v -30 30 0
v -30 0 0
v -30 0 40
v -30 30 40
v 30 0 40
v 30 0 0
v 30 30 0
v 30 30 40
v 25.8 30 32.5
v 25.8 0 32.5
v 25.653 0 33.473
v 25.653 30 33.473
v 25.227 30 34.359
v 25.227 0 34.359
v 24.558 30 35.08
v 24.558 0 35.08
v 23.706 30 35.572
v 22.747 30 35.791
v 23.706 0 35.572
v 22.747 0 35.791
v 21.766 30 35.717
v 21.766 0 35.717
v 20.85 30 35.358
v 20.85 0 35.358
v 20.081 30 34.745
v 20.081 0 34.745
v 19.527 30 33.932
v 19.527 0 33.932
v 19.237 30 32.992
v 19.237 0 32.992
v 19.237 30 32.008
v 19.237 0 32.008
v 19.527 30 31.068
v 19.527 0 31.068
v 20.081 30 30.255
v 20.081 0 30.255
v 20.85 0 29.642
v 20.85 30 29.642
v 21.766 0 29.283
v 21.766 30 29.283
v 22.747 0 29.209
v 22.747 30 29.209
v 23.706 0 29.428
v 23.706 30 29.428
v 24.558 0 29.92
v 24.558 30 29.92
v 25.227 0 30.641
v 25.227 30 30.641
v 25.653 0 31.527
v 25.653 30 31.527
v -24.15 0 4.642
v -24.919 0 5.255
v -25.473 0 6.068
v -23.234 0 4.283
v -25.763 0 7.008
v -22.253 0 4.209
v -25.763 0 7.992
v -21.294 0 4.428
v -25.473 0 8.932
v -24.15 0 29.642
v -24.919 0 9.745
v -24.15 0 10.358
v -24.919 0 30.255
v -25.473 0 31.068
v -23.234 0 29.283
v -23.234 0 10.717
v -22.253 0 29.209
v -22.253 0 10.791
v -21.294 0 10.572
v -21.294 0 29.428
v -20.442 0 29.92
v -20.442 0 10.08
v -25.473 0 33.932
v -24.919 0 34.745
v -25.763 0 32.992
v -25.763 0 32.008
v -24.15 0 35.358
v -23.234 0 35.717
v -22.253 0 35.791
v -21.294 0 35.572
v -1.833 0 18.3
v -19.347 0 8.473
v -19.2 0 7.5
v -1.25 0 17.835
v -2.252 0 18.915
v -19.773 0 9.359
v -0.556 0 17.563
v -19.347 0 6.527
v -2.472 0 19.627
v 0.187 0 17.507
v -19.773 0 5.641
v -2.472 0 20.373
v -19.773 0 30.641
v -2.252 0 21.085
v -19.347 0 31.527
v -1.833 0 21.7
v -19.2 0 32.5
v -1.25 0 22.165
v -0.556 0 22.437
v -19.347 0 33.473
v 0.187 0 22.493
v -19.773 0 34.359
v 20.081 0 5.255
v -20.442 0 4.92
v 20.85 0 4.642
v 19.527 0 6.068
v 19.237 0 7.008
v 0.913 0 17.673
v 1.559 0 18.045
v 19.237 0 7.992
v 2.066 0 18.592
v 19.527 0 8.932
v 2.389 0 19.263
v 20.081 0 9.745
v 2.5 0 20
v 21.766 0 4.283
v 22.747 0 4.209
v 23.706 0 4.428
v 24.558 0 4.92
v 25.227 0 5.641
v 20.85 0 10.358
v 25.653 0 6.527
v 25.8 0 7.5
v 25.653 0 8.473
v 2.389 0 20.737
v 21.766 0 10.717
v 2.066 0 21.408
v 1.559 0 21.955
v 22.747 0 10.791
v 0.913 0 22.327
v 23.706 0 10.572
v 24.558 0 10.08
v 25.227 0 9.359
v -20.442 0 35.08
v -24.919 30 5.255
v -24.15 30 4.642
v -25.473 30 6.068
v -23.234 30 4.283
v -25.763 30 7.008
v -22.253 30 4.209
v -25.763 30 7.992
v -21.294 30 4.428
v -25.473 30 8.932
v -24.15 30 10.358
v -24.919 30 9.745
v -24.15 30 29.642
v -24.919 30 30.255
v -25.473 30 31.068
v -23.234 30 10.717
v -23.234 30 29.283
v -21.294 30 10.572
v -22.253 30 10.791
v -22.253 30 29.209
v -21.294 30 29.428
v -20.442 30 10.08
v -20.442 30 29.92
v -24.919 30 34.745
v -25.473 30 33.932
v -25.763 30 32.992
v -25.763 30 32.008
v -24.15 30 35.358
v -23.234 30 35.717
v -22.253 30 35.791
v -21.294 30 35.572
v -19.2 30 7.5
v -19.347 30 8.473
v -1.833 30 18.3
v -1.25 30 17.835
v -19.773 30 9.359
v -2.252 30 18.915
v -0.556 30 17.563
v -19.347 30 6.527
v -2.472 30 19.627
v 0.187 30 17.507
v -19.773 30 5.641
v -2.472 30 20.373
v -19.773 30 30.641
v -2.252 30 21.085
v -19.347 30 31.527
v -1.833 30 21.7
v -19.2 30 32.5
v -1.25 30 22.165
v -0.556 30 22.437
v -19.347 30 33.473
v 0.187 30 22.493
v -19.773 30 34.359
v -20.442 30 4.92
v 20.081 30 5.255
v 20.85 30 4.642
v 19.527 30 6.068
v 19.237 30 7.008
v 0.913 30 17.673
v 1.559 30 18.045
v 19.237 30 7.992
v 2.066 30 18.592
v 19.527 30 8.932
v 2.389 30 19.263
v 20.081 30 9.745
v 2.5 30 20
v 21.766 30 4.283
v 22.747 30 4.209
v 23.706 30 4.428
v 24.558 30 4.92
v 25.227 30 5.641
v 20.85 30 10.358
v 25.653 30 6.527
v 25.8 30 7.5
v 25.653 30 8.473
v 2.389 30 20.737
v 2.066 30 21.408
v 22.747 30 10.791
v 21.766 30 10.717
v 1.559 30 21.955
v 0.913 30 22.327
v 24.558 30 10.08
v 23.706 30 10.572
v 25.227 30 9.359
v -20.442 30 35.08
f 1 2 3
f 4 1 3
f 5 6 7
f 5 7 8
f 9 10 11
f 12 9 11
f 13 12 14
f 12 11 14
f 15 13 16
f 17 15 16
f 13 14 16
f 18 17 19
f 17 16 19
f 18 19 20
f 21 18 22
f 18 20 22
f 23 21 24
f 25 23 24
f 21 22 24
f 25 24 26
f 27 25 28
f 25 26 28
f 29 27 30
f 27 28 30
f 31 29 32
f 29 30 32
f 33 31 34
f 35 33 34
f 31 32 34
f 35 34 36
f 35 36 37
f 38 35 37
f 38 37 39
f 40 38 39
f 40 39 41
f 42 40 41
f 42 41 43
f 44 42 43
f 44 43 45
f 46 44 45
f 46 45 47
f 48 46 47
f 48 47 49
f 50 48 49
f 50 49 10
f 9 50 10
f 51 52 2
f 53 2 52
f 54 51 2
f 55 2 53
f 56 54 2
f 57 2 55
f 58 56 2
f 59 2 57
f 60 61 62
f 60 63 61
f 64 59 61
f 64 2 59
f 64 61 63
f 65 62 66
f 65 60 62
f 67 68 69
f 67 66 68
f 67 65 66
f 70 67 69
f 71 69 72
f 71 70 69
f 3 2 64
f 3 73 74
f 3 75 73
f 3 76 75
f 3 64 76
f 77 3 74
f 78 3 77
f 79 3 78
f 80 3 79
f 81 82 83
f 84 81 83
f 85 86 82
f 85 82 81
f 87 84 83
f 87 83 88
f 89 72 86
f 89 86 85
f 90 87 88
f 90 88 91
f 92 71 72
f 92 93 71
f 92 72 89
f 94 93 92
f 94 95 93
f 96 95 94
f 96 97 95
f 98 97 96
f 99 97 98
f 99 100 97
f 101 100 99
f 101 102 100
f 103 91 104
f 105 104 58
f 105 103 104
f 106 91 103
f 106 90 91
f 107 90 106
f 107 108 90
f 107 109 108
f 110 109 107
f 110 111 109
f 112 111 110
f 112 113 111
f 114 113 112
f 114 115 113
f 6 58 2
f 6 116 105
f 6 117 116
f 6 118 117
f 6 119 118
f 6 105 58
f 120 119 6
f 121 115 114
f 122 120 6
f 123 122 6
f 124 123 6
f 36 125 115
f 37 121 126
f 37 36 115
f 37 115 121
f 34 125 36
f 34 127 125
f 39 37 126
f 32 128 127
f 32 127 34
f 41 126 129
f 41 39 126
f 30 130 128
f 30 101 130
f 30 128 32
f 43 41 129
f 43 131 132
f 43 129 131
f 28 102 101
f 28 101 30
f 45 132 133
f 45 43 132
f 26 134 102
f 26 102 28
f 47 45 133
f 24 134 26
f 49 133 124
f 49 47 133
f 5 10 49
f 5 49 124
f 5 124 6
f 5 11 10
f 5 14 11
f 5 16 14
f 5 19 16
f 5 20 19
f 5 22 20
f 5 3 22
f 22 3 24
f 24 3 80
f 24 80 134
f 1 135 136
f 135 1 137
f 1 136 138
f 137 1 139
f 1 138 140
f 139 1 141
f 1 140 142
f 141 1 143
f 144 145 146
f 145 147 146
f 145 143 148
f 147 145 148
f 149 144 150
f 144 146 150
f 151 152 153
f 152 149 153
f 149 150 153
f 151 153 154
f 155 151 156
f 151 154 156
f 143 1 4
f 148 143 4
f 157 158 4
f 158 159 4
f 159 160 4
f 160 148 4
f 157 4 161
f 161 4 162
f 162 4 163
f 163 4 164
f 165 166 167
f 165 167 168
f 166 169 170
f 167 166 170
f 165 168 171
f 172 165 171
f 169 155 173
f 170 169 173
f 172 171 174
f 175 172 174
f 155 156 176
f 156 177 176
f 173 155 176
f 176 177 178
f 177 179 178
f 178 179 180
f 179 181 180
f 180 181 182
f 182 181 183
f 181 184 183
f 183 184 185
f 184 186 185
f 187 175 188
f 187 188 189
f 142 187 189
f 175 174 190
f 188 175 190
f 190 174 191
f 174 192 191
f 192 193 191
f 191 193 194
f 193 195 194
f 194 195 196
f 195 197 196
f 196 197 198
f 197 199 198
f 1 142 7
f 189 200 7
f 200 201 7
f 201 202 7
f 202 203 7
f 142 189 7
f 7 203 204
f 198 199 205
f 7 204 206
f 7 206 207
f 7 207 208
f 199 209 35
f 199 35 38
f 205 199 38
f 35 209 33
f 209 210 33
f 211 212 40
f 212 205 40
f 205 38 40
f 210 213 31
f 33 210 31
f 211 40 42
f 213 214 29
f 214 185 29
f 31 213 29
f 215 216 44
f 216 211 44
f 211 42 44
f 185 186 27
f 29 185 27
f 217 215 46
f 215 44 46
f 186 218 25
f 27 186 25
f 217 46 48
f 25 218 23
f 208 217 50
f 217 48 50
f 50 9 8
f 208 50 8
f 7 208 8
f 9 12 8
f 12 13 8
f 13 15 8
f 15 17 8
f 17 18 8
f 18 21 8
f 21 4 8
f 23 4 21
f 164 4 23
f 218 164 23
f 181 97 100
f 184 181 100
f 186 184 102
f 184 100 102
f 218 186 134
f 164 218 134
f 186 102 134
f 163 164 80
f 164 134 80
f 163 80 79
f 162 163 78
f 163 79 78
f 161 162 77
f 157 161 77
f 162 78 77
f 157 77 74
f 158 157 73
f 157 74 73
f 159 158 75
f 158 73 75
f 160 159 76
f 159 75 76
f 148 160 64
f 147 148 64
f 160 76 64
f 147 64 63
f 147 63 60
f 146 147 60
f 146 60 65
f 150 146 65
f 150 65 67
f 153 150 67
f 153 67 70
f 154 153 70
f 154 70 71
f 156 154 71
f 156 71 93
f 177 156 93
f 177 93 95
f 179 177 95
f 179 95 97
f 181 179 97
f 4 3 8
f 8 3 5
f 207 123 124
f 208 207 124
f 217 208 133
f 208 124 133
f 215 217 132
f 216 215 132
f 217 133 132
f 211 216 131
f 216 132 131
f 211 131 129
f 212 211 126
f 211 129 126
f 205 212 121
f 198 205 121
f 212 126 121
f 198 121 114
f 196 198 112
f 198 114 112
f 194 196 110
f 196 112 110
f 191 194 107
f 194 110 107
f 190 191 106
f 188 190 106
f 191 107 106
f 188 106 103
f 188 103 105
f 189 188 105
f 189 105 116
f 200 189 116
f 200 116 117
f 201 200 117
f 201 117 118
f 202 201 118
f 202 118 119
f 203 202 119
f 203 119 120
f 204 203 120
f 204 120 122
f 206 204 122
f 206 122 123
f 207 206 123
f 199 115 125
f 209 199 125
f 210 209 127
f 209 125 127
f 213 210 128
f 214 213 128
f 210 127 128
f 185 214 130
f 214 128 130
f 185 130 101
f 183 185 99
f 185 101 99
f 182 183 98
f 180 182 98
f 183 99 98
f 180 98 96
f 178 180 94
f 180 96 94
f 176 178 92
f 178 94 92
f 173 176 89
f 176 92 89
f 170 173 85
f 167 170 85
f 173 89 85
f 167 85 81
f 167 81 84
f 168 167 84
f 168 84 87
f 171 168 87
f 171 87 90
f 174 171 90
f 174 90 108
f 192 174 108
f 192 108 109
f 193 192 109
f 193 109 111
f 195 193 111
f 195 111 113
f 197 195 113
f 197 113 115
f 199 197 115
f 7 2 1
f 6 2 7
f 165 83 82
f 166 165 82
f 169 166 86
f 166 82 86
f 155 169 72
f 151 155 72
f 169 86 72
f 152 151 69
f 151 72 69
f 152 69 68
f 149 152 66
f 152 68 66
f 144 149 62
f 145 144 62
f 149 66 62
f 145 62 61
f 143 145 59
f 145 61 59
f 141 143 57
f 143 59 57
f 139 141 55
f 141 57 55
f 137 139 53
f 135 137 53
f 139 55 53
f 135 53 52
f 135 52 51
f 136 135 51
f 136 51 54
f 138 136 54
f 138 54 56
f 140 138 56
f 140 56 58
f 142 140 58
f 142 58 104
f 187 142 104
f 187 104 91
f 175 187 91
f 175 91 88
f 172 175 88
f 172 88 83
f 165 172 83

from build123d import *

# Parameters (mm, degrees)
SKETCH_W      = 60
SKETCH_H      = 40
PAD_DEPTH     = 30
SKETCH001_R   = 2.5
HOLE_DEPTH    = 30.001
SKETCH005_R   = 3.3
HOLE002_DEPTH = 30.001


with BuildPart() as part:
    # Sketch → Pad (new body)
    with BuildSketch(Plane.XZ):
        with Locations((0, 20)):
            Rectangle(SKETCH_W, SKETCH_H)
    extrude(amount=-PAD_DEPTH)

    # Sketch001 → Hole (cut, through all)
    with BuildSketch(Plane.XZ):
        with Locations((0, 20)):
            Circle(SKETCH001_R)
    extrude(amount=-HOLE_DEPTH, mode=Mode.SUBTRACT)

    # Sketch005 → Hole002 (cut, through all)
    with BuildSketch(Plane.XZ):
        with Locations((-22.5, 32.5)):
            Circle(SKETCH005_R)
        with Locations((22.5, 7.5)):
            Circle(SKETCH005_R)
        with Locations((22.5, 32.5)):
            Circle(SKETCH005_R)
        with Locations((-22.5, 7.5)):
            Circle(SKETCH005_R)
    extrude(amount=-HOLE002_DEPTH, mode=Mode.SUBTRACT)


solid = part.part
